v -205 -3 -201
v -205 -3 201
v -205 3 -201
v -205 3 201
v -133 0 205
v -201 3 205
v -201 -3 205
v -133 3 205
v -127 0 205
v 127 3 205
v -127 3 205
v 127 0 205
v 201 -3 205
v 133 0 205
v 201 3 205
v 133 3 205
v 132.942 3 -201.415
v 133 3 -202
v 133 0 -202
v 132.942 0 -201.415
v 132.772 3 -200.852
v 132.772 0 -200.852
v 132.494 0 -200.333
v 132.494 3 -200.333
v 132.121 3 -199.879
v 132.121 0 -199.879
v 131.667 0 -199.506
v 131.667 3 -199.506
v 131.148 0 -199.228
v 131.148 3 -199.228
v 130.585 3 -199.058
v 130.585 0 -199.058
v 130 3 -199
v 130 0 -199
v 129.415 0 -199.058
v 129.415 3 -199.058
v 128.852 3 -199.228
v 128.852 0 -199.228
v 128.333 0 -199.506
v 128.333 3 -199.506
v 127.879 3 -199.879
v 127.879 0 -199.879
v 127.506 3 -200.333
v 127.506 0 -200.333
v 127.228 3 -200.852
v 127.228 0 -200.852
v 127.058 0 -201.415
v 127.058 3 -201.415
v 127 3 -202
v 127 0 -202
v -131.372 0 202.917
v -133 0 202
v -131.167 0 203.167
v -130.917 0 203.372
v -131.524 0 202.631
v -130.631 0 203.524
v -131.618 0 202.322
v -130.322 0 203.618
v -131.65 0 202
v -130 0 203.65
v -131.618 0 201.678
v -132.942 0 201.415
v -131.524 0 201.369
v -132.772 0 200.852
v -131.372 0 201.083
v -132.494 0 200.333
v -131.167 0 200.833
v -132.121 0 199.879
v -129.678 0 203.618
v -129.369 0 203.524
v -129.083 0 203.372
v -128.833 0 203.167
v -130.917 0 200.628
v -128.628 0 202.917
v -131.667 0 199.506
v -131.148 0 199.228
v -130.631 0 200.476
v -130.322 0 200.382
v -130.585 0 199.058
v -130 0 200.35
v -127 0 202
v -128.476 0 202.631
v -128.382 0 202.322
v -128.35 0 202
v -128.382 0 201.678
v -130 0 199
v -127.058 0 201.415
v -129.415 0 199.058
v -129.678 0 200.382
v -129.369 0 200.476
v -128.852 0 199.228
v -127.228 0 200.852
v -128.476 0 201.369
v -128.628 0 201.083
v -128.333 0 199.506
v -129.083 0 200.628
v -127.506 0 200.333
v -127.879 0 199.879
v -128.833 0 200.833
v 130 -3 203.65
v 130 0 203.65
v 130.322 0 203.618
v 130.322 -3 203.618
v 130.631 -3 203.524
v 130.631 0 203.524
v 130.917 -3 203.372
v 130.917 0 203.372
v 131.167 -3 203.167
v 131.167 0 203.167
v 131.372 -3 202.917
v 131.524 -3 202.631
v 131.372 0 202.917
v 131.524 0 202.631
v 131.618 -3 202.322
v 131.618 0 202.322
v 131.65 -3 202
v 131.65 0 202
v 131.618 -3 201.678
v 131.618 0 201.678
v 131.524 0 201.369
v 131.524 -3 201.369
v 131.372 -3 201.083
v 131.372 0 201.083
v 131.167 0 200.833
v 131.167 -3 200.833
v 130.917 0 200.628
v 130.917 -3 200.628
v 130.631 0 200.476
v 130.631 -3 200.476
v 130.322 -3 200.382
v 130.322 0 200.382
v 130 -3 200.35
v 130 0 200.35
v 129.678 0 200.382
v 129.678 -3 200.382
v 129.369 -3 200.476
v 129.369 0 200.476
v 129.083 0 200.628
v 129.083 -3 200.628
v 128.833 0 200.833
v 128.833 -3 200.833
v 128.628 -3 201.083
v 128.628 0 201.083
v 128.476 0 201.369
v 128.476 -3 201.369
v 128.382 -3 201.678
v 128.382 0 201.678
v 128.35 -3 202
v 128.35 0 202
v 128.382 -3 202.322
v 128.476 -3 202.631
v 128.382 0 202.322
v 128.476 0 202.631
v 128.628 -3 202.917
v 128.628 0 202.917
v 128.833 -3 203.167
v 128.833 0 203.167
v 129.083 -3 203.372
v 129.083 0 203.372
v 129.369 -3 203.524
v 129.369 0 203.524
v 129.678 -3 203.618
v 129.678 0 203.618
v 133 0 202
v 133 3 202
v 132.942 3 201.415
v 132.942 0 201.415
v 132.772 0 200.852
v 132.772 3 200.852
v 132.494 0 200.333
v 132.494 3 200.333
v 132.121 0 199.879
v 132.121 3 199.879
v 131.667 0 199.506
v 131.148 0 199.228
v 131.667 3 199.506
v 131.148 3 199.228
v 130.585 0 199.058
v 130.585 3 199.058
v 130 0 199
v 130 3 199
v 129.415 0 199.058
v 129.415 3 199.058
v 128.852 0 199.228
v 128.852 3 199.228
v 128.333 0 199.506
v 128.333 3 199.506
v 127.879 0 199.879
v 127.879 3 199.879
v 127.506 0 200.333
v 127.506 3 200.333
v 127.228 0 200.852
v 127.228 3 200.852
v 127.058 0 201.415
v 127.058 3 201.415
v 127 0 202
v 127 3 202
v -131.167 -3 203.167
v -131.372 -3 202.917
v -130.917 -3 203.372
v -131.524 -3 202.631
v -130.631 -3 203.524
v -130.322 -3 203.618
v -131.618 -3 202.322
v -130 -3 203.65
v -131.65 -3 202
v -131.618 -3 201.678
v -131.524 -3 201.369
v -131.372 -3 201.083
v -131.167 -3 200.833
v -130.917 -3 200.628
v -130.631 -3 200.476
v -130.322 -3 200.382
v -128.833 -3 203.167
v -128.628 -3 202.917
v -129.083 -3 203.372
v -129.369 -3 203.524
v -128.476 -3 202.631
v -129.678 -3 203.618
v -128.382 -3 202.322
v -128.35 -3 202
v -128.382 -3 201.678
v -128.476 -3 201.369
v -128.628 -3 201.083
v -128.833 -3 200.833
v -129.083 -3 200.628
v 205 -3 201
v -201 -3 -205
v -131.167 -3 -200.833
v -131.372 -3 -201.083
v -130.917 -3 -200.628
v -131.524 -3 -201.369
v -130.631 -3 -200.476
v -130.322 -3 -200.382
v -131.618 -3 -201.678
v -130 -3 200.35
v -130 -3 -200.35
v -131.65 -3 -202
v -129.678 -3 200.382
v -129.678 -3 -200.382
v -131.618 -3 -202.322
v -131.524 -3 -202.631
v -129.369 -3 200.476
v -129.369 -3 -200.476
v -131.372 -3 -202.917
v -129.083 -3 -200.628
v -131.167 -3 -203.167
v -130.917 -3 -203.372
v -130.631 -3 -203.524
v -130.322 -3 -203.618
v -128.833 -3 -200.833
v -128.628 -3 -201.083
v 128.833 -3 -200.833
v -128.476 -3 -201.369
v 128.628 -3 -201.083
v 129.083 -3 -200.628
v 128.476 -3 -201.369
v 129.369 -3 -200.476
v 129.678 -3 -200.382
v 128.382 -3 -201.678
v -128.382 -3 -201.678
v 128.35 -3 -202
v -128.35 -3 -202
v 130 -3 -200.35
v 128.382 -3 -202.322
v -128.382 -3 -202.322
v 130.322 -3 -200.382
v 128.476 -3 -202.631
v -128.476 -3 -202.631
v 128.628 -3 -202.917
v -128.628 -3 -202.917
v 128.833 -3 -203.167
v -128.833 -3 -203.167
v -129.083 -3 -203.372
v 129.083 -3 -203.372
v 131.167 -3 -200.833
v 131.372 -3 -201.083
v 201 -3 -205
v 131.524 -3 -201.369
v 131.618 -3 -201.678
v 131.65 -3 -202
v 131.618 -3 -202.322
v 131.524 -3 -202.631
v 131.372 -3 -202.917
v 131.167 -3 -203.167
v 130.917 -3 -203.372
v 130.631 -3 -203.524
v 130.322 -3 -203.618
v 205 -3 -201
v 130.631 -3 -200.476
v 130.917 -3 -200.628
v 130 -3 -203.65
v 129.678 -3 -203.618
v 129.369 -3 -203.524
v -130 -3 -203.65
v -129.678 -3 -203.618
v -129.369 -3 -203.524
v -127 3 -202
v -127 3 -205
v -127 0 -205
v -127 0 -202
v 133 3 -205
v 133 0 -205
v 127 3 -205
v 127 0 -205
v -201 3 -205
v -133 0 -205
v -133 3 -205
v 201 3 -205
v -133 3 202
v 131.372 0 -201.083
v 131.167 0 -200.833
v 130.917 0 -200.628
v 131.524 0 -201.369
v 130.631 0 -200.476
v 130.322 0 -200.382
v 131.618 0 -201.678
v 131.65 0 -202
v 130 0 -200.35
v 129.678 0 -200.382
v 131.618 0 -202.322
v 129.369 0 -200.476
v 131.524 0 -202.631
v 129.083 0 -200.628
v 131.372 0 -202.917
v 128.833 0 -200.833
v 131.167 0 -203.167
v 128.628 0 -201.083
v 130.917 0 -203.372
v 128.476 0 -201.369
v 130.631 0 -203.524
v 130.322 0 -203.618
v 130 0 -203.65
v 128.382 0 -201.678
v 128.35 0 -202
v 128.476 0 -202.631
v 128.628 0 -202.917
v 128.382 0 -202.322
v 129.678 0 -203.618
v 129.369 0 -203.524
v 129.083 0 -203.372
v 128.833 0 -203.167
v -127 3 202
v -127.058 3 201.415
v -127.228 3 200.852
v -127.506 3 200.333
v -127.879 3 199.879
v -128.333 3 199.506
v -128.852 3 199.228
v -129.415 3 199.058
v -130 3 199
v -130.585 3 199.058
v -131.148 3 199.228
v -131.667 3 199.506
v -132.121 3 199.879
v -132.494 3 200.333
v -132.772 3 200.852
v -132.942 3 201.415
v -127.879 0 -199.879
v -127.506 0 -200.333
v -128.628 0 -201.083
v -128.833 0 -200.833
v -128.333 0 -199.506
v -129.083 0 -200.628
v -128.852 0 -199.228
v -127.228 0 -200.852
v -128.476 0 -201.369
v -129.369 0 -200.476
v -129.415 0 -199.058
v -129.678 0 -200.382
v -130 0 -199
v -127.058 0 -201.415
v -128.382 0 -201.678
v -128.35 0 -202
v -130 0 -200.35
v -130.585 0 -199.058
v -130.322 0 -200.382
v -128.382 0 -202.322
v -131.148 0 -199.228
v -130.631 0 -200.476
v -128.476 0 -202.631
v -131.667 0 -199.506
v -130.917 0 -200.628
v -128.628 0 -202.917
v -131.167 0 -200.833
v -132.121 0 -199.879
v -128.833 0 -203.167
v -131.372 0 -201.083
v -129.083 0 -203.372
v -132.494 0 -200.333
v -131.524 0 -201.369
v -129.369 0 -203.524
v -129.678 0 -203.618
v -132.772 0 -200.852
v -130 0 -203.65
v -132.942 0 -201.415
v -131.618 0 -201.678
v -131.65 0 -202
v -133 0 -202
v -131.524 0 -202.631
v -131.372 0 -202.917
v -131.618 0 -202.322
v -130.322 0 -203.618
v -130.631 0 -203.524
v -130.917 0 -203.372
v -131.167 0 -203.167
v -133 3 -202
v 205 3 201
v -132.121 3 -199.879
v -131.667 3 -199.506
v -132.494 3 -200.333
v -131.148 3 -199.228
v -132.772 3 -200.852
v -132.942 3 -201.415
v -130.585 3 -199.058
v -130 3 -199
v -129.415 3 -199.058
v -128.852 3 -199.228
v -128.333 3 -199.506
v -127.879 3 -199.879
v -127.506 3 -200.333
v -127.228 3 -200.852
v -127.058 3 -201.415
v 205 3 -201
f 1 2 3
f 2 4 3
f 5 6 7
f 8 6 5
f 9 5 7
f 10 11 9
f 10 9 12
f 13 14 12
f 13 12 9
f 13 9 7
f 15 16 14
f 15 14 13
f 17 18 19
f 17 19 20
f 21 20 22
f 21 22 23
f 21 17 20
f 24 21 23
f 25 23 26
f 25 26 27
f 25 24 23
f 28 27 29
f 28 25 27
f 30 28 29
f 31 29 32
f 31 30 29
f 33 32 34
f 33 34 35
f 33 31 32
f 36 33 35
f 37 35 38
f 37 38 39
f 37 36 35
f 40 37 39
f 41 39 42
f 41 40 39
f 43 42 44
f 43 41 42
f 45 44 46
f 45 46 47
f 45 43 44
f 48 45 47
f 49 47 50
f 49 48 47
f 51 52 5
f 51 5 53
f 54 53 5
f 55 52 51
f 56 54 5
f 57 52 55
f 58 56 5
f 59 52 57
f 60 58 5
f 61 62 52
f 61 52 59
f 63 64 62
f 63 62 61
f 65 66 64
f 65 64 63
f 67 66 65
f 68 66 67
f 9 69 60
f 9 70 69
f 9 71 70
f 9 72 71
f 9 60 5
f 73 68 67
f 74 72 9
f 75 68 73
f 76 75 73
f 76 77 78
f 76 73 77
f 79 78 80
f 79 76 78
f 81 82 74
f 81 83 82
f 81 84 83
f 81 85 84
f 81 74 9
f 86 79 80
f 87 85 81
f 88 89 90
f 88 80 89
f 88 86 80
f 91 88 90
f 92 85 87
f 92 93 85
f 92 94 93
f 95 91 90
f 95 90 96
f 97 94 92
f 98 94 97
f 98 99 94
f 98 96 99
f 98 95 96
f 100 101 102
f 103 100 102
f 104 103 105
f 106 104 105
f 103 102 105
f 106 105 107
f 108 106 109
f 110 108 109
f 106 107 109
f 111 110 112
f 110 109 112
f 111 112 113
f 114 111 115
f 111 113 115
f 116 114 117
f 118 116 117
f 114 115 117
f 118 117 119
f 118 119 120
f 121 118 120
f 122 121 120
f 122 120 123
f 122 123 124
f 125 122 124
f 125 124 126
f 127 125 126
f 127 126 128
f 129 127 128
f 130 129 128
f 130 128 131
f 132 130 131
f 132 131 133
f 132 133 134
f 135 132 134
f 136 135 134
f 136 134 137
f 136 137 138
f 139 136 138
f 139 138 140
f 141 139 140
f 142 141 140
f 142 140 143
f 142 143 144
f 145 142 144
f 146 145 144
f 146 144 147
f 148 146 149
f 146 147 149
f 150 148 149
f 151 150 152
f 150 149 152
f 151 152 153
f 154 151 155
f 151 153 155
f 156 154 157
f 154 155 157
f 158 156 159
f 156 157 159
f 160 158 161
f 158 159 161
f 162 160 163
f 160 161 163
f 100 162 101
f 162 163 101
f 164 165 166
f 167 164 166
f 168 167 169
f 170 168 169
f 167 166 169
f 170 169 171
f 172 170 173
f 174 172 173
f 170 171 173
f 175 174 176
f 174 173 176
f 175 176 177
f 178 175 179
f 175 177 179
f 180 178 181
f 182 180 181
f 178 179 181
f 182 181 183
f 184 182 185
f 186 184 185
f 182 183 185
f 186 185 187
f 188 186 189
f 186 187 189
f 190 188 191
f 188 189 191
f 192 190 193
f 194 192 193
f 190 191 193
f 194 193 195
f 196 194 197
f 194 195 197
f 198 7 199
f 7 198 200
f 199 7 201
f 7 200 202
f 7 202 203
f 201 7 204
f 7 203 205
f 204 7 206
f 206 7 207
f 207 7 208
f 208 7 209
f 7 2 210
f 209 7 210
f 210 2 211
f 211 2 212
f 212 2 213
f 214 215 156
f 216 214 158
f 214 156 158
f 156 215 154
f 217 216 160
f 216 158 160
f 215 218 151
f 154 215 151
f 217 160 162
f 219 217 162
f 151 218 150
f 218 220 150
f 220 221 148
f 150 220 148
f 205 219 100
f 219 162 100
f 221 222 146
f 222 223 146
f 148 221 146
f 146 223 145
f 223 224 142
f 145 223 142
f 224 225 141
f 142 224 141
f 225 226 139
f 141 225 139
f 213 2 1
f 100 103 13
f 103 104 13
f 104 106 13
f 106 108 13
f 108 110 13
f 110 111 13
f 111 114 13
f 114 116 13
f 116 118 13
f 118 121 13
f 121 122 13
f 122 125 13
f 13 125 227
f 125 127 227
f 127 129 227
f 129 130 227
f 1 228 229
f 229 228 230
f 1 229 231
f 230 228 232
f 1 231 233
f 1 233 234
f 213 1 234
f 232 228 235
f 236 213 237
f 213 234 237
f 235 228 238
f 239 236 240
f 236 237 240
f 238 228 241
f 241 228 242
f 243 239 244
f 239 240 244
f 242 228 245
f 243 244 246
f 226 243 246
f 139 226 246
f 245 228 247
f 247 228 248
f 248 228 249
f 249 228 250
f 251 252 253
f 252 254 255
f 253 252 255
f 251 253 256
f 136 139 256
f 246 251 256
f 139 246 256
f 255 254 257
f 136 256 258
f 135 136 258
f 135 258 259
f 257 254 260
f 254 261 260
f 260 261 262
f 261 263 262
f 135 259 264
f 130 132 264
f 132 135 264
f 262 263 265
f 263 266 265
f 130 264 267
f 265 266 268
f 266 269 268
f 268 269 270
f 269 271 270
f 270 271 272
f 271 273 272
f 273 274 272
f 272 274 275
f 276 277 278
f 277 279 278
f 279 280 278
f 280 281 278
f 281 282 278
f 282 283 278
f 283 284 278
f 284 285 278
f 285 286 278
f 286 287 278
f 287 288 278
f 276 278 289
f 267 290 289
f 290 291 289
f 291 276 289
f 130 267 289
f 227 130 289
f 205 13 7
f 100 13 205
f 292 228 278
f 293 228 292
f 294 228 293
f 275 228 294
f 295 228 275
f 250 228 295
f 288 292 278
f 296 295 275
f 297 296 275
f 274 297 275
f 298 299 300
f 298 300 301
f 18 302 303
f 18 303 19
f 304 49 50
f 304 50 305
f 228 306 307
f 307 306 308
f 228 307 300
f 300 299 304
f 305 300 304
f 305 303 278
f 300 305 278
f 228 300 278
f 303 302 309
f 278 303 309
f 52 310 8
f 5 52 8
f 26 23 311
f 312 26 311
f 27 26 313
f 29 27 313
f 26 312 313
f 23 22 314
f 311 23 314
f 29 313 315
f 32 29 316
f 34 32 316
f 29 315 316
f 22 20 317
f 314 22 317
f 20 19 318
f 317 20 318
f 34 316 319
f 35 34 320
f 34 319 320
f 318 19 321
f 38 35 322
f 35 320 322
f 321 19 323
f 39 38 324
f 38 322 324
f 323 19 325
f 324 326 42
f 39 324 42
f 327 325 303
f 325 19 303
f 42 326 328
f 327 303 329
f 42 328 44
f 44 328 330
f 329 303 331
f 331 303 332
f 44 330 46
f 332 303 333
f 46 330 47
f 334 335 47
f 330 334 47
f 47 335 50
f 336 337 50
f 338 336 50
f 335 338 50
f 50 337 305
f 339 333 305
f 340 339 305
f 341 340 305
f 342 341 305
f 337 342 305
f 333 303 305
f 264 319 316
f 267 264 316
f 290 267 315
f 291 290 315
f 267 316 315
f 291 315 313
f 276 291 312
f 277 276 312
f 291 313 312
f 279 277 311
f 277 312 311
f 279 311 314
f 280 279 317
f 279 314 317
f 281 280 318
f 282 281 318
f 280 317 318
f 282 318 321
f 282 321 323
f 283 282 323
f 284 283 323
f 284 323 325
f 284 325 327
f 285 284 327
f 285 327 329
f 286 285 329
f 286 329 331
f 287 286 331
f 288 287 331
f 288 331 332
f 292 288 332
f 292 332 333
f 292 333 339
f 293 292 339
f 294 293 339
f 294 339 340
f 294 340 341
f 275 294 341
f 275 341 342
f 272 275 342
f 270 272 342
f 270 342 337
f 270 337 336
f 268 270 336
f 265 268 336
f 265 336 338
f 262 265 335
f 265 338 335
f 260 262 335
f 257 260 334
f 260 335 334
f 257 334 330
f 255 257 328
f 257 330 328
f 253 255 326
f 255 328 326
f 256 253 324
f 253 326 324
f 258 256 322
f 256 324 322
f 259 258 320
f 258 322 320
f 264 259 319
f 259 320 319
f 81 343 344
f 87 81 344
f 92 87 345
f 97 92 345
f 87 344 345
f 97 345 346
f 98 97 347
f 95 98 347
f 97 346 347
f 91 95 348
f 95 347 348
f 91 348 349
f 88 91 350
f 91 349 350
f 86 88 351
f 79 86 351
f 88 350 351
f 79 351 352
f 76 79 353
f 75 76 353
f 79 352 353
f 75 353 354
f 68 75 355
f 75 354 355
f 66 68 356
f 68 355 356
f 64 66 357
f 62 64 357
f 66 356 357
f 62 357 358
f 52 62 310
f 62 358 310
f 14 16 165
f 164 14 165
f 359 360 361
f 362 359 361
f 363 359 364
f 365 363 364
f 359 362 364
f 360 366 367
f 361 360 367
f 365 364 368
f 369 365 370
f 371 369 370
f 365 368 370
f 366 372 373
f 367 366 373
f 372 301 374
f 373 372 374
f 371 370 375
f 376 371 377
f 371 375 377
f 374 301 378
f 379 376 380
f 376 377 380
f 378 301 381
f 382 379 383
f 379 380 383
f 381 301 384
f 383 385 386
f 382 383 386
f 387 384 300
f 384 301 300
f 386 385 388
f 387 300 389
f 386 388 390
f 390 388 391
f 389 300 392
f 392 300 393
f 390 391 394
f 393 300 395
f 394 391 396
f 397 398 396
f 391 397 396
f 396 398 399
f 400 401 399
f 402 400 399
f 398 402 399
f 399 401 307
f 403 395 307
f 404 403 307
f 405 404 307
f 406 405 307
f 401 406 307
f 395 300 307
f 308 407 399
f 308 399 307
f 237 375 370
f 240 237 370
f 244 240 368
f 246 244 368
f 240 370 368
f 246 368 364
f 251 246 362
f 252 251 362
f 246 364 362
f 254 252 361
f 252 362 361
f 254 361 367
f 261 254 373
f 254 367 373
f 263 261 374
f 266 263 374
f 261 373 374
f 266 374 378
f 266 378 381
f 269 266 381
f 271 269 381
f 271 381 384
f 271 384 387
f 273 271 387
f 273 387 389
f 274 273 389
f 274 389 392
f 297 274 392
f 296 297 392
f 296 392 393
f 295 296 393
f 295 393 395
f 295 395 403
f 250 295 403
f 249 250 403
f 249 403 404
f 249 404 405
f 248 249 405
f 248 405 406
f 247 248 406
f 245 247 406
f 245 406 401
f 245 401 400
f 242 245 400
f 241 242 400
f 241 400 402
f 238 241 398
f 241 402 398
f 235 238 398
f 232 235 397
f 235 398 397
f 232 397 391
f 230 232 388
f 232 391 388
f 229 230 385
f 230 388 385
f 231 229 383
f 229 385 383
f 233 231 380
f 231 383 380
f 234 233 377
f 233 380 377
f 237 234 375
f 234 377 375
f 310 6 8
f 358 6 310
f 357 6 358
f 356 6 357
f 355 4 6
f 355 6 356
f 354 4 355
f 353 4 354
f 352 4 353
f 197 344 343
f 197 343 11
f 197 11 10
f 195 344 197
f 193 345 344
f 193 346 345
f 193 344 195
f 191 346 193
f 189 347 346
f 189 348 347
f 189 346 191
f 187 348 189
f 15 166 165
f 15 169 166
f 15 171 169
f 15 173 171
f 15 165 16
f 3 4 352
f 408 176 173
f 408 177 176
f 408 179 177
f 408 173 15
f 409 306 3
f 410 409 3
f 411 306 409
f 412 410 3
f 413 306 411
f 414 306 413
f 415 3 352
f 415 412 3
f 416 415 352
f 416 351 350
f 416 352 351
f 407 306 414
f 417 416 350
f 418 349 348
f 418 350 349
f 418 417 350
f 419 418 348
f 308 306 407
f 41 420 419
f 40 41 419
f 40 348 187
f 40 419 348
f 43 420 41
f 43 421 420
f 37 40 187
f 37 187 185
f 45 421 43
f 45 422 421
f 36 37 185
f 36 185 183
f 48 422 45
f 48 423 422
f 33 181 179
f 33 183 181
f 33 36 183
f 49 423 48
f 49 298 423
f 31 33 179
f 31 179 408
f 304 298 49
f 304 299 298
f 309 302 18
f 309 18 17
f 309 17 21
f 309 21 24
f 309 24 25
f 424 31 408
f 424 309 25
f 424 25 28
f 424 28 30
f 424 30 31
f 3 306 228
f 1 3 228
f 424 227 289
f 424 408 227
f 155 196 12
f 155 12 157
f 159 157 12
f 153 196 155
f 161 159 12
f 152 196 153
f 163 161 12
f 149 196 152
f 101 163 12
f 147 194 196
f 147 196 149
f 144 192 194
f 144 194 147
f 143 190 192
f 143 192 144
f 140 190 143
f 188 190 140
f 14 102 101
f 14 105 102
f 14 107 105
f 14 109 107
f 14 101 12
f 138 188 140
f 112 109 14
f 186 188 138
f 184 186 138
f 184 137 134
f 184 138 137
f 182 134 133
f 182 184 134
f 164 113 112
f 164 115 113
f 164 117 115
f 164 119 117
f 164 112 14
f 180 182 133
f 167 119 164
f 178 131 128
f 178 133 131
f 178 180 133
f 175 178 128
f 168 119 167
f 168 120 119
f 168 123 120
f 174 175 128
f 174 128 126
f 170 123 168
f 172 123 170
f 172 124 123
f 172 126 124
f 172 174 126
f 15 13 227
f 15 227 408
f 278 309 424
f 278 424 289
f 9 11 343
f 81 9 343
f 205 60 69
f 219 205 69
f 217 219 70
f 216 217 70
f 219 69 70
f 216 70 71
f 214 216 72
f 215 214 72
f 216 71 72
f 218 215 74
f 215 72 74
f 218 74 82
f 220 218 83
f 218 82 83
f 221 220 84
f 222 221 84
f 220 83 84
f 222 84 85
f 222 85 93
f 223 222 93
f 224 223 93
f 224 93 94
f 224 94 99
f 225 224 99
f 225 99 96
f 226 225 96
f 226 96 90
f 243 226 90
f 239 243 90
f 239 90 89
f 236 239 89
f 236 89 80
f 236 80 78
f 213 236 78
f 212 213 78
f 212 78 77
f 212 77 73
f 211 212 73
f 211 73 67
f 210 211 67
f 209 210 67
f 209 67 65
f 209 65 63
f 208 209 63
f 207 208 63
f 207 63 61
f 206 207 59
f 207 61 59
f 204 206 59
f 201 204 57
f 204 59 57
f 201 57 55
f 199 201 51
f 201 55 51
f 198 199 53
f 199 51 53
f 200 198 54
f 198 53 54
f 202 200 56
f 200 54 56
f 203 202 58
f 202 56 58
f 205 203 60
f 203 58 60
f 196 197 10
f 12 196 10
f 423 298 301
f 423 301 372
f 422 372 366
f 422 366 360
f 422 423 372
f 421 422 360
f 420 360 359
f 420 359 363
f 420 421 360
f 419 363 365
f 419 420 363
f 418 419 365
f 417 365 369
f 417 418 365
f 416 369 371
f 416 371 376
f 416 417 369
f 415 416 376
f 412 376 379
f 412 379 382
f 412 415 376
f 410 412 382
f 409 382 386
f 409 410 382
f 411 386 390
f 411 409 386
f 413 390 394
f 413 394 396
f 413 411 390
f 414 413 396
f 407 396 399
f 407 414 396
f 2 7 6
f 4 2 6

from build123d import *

# Parameters (mm, degrees)
SKETCH1_W           = 410
SKETCH1_H           = 410
BOSS_EXTRUDE1_DEPTH = 3
CHAMFER1_SIZE       = 4
CUT_EXTRUDE1_DEPTH  = 3
SKETCH3_R           = 1.65
CUT_EXTRUDE2_DEPTH  = 290.929301727


with BuildPart() as part:
    # Sketch1 → Boss-Extrude1 (new, symmetric)
    with BuildSketch(Plane(origin=(0, 0, 0), x_dir=(1, 0, 0), z_dir=(0, 1, 0))):
        Rectangle(SKETCH1_W, SKETCH1_H)
    extrude(amount=BOSS_EXTRUDE1_DEPTH, both=True)

    # Chamfer1
    chamfer1_edges = [part.edges().sort_by_distance(p)[0] for p in [
        (-205, 0, -205),
        (205, 0, -205),
        (205, 0, 205),
        (-205, 0, 205),
    ]]
    chamfer(chamfer1_edges, length=CHAMFER1_SIZE)

    # Sketch2 → Cut-Extrude1 (cut)
    with BuildSketch(Plane(origin=(0, 3, 0), x_dir=(1, 0, 0), z_dir=(0, 1, 0))):
        with BuildLine():
            Line((-133, 202), (-133, 205))
            Line((-133, 205), (-127, 205))
            Line((-127, 205), (-127, 202))
            ThreePointArc((-127, 202), (-130, 199), (-133, 202))
        make_face()
        with BuildLine():
            Line((127, 202), (127, 205))
            Line((127, 205), (133, 205))
            Line((133, 205), (133, 202))
            ThreePointArc((133, 202), (130, 199), (127, 202))
        make_face()
        with BuildLine():
            Line((-133, -202), (-133, -205))
            Line((-133, -205), (-127, -205))
            Line((-127, -205), (-127, -202))
            ThreePointArc((-127, -202), (-130, -199), (-133, -202))
        make_face()
        with BuildLine():
            Line((127, -202), (127, -205))
            Line((127, -205), (133, -205))
            Line((133, -205), (133, -202))
            ThreePointArc((133, -202), (130, -199), (127, -202))
        make_face()
    extrude(amount=-CUT_EXTRUDE1_DEPTH, mode=Mode.SUBTRACT)

    # Sketch3 → Cut-Extrude2 (cut, through all)
    with BuildSketch(Plane(origin=(0, 0, 0), x_dir=(1, 0, 0), z_dir=(0, 1, 0))):
        with Locations(Location((-130, -202, 0), (0, 0, 270))):
            Circle(SKETCH3_R)
        with Locations(Location((130, -202, 0), (0, 0, 270))):
            Circle(SKETCH3_R)
        with Locations(Location((130, 202, 0), (0, 0, 270))):
            Circle(SKETCH3_R)
        with Locations(Location((-130, 202, 0), (0, 0, 270))):
            Circle(SKETCH3_R)
    extrude(amount=-CUT_EXTRUDE2_DEPTH, mode=Mode.SUBTRACT)


solid = part.part
